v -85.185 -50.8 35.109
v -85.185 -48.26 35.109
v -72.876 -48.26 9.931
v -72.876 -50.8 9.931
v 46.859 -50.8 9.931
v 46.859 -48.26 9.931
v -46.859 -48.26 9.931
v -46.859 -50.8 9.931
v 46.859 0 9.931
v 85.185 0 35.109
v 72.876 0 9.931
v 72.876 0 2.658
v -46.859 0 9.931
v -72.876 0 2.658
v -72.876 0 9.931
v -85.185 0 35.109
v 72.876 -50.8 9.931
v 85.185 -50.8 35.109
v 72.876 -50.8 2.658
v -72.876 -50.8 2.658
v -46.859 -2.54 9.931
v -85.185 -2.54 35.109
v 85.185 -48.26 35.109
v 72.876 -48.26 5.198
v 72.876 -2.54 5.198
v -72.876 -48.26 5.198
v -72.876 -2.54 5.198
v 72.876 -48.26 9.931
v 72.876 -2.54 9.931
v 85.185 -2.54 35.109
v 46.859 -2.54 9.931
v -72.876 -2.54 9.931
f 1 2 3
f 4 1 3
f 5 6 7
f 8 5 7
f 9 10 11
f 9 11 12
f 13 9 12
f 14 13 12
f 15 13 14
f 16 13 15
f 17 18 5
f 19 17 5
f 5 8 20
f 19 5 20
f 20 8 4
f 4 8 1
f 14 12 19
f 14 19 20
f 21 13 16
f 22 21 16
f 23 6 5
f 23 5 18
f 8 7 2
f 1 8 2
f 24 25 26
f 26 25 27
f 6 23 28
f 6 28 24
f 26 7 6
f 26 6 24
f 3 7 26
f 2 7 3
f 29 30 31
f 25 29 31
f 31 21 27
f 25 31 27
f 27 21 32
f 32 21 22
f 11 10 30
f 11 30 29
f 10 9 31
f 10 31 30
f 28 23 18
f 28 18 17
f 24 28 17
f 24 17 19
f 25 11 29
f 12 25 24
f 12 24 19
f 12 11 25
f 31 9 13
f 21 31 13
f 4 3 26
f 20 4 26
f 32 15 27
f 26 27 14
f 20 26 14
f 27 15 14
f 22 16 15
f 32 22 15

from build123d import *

# Parameters (mm, degrees)
F1_DEPTH = 50.8
F2_DEPTH = 50.8
F4_T     = -2.54


with BuildPart() as f1:
    # F0 (on Front) → F1 (new body)
    with BuildSketch(Plane.XZ):
        Polygon((-85.1854681969, 35.1092815399), (-72.8762447834, 9.9313110113), (-46.8590036035, 9.9313110113), align=None)
    extrude(amount=F1_DEPTH)

    # F0 (on Front) → F2 (join)
    with BuildSketch(Plane.XZ):
        Polygon((-46.8590036035, 9.9313110113), (-72.8762447834, 9.9313110113), (-72.8762447834, 2.6576747186), (48.8172881305, 2.6576747186), (48.8172881305, 9.9313110113), align=None)
    extrude(amount=F2_DEPTH)

    # F3: F1 across plane


with BuildPart() as f1_1:
    add(f1.part)
    add(f1.part.mirror(Plane.YZ))

    # F4
    f4_openings = [f1_1.faces().sort_by_distance(p)[0] for p in [
        (-66.022236, -25.4, 22.520296),
        (79.030856, -25.4, 22.520296),
        (66.022236, -25.4, 22.520296),
        (-79.030856, -25.4, 22.520296),
        (0, -25.4, 9.931311),
        (72.876245, -25.4, 6.294493),
        (-72.876245, -25.4, 6.294493),
    ]]
    offset(amount=F4_T, openings=f4_openings)


solid = f1_1.part
